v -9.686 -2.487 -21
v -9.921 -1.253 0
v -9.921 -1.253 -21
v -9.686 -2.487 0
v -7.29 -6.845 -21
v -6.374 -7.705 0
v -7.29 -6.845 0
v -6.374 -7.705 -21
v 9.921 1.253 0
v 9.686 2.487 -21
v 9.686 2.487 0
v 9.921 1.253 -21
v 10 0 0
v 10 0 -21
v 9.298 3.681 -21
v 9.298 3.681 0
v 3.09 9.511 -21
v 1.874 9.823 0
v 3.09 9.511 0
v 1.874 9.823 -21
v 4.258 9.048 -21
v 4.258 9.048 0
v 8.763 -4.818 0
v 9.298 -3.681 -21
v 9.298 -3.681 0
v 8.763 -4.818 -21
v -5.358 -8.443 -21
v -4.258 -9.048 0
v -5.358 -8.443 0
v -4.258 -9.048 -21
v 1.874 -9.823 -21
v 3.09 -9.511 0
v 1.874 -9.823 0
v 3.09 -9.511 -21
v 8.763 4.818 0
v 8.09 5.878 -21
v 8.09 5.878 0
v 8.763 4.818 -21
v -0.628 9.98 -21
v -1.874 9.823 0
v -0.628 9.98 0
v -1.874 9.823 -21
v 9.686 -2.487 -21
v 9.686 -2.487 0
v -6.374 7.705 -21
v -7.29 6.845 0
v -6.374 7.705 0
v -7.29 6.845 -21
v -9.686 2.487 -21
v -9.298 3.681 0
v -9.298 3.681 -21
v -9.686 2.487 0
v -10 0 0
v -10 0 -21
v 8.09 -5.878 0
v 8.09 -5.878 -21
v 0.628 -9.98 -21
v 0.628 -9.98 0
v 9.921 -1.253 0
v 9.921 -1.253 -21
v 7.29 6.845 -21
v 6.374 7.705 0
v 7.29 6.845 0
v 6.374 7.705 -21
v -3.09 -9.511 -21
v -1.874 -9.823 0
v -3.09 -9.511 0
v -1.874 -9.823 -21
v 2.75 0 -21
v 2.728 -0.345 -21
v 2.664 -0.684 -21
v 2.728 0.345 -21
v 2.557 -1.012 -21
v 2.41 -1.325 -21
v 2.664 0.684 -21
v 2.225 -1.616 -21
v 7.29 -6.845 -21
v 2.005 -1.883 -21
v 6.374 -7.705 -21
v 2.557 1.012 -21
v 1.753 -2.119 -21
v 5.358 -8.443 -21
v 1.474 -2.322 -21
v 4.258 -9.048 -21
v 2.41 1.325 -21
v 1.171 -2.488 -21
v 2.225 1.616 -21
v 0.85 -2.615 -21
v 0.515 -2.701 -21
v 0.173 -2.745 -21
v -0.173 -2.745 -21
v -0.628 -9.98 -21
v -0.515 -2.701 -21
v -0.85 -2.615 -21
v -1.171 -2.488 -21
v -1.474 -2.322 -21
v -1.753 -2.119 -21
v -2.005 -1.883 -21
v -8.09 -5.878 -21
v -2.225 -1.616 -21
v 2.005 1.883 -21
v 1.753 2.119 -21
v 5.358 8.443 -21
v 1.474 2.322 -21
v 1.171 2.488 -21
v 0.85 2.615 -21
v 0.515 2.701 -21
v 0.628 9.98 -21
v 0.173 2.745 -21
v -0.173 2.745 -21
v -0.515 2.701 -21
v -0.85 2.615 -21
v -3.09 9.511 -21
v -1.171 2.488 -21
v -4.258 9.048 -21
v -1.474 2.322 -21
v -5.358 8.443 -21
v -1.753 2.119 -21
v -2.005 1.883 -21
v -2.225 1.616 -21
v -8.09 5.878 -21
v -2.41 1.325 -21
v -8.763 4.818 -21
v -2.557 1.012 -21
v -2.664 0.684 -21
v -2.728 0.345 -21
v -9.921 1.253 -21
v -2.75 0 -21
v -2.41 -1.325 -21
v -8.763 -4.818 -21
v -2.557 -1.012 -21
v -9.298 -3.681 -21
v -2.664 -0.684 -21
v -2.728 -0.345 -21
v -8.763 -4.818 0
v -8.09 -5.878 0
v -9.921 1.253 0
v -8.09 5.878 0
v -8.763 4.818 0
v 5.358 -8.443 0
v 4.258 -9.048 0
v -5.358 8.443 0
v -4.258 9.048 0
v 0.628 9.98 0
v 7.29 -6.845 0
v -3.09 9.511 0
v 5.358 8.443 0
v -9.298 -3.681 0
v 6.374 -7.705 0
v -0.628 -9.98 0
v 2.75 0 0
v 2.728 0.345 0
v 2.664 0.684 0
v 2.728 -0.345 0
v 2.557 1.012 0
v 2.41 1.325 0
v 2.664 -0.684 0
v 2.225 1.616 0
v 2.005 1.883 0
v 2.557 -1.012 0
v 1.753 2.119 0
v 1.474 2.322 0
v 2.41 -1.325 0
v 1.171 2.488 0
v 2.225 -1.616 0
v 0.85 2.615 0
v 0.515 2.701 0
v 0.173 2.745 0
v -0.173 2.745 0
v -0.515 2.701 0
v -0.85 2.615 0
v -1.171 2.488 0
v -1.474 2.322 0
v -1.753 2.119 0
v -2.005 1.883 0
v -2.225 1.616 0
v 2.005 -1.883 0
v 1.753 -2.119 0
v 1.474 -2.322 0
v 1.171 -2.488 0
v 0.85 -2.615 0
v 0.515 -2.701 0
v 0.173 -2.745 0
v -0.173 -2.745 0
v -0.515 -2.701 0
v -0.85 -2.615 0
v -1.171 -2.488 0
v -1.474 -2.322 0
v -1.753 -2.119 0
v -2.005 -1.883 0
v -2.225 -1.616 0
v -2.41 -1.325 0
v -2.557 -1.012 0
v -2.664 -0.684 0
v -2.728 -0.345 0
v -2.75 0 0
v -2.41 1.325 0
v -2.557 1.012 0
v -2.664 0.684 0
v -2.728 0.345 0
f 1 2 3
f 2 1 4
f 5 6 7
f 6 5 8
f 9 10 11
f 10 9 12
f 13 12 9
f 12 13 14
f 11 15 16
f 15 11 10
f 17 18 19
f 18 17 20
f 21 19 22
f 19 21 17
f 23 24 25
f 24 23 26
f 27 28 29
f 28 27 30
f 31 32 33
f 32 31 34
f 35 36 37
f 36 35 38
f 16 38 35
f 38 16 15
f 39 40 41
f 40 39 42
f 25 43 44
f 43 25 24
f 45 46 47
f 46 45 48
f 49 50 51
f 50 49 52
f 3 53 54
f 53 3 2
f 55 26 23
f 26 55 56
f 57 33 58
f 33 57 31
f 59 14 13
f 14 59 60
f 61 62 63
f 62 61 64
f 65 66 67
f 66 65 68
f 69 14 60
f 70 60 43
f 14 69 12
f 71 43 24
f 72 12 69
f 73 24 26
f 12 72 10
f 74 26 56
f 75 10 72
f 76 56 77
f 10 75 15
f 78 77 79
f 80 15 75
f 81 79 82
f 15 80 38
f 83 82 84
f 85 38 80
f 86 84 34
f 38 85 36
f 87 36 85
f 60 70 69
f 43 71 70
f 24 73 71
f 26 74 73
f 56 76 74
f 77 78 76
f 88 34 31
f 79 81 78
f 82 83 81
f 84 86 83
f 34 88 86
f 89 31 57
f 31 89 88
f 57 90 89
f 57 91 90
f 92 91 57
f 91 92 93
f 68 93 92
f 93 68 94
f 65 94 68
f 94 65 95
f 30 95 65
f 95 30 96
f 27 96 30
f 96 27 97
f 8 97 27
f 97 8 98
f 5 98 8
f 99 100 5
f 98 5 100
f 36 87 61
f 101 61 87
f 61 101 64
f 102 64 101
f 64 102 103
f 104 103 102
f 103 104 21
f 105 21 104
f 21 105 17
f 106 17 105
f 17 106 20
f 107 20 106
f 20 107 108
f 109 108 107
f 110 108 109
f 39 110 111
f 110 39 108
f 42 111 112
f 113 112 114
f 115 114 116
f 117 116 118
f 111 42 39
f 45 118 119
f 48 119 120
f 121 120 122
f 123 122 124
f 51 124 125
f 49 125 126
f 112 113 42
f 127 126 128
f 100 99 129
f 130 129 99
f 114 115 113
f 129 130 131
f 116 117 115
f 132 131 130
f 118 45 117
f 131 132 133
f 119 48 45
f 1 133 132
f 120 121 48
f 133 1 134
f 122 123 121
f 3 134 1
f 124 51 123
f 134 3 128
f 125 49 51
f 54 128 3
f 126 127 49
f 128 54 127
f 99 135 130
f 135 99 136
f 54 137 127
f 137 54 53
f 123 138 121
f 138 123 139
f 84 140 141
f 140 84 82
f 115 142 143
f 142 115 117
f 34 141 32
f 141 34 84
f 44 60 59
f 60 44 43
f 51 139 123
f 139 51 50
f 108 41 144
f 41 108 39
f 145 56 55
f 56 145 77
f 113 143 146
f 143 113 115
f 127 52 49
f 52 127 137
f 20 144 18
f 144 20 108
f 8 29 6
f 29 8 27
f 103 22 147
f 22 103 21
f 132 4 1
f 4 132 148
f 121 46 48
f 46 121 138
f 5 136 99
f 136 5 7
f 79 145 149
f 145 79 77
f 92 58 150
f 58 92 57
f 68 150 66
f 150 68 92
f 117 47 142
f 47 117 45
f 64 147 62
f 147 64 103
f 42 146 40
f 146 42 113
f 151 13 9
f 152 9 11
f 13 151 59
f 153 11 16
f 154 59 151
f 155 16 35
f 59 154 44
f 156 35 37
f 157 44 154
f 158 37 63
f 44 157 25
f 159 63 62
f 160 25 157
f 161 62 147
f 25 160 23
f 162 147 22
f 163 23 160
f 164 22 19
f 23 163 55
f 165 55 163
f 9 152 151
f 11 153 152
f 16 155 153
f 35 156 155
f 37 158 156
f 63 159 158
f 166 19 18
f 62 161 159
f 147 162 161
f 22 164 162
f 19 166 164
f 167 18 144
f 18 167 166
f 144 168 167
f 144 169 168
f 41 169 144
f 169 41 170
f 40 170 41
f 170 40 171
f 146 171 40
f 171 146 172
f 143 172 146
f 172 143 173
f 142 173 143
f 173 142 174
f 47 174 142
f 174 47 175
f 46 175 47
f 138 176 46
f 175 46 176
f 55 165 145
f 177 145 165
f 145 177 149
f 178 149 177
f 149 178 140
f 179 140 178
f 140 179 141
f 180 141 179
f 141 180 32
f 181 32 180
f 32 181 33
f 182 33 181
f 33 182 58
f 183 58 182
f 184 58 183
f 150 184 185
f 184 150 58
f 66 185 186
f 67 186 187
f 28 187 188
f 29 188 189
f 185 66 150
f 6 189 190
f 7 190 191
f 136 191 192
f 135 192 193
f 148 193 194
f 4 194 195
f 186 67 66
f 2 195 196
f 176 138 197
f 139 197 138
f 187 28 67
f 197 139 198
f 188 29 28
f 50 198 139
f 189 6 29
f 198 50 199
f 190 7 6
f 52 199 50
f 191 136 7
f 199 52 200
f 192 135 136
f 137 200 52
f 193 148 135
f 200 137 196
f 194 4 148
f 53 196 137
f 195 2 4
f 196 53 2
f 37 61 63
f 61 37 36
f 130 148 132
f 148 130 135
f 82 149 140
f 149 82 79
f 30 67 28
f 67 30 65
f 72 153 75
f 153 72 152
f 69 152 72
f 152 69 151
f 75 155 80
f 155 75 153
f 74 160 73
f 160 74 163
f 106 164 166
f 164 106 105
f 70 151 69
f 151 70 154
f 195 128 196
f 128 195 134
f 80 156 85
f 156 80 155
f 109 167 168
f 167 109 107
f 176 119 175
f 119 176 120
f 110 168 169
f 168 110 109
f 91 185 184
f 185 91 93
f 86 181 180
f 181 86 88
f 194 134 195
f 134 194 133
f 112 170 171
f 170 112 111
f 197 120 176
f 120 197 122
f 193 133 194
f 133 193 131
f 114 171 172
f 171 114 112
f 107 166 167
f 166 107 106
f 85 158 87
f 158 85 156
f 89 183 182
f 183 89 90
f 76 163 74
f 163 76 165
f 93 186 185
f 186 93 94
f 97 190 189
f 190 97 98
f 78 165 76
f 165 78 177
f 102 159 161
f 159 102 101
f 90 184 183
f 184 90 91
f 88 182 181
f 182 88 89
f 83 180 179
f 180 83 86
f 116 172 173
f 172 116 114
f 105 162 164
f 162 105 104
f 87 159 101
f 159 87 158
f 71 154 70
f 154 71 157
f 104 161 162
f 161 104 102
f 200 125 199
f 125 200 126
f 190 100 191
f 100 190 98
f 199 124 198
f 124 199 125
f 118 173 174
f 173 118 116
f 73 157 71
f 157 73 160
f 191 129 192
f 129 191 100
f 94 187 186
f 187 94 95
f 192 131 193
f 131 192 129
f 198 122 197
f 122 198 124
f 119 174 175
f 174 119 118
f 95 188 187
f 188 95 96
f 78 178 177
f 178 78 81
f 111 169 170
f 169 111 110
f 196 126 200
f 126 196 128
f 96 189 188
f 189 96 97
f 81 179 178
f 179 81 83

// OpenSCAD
$fn = 50;


difference() {
	union() {
		translate(v = [0, 0, -21.0000000000]) {
			cylinder(h = 21, r = 10.0000000000);
		}
		cylinder(h = 0, r = 16.0000000000);
	}
	union() {
		#translate(v = [0, 0, -21]) {
			cylinder(h = 21, r = 2.7500000000);
		}
	}
}
